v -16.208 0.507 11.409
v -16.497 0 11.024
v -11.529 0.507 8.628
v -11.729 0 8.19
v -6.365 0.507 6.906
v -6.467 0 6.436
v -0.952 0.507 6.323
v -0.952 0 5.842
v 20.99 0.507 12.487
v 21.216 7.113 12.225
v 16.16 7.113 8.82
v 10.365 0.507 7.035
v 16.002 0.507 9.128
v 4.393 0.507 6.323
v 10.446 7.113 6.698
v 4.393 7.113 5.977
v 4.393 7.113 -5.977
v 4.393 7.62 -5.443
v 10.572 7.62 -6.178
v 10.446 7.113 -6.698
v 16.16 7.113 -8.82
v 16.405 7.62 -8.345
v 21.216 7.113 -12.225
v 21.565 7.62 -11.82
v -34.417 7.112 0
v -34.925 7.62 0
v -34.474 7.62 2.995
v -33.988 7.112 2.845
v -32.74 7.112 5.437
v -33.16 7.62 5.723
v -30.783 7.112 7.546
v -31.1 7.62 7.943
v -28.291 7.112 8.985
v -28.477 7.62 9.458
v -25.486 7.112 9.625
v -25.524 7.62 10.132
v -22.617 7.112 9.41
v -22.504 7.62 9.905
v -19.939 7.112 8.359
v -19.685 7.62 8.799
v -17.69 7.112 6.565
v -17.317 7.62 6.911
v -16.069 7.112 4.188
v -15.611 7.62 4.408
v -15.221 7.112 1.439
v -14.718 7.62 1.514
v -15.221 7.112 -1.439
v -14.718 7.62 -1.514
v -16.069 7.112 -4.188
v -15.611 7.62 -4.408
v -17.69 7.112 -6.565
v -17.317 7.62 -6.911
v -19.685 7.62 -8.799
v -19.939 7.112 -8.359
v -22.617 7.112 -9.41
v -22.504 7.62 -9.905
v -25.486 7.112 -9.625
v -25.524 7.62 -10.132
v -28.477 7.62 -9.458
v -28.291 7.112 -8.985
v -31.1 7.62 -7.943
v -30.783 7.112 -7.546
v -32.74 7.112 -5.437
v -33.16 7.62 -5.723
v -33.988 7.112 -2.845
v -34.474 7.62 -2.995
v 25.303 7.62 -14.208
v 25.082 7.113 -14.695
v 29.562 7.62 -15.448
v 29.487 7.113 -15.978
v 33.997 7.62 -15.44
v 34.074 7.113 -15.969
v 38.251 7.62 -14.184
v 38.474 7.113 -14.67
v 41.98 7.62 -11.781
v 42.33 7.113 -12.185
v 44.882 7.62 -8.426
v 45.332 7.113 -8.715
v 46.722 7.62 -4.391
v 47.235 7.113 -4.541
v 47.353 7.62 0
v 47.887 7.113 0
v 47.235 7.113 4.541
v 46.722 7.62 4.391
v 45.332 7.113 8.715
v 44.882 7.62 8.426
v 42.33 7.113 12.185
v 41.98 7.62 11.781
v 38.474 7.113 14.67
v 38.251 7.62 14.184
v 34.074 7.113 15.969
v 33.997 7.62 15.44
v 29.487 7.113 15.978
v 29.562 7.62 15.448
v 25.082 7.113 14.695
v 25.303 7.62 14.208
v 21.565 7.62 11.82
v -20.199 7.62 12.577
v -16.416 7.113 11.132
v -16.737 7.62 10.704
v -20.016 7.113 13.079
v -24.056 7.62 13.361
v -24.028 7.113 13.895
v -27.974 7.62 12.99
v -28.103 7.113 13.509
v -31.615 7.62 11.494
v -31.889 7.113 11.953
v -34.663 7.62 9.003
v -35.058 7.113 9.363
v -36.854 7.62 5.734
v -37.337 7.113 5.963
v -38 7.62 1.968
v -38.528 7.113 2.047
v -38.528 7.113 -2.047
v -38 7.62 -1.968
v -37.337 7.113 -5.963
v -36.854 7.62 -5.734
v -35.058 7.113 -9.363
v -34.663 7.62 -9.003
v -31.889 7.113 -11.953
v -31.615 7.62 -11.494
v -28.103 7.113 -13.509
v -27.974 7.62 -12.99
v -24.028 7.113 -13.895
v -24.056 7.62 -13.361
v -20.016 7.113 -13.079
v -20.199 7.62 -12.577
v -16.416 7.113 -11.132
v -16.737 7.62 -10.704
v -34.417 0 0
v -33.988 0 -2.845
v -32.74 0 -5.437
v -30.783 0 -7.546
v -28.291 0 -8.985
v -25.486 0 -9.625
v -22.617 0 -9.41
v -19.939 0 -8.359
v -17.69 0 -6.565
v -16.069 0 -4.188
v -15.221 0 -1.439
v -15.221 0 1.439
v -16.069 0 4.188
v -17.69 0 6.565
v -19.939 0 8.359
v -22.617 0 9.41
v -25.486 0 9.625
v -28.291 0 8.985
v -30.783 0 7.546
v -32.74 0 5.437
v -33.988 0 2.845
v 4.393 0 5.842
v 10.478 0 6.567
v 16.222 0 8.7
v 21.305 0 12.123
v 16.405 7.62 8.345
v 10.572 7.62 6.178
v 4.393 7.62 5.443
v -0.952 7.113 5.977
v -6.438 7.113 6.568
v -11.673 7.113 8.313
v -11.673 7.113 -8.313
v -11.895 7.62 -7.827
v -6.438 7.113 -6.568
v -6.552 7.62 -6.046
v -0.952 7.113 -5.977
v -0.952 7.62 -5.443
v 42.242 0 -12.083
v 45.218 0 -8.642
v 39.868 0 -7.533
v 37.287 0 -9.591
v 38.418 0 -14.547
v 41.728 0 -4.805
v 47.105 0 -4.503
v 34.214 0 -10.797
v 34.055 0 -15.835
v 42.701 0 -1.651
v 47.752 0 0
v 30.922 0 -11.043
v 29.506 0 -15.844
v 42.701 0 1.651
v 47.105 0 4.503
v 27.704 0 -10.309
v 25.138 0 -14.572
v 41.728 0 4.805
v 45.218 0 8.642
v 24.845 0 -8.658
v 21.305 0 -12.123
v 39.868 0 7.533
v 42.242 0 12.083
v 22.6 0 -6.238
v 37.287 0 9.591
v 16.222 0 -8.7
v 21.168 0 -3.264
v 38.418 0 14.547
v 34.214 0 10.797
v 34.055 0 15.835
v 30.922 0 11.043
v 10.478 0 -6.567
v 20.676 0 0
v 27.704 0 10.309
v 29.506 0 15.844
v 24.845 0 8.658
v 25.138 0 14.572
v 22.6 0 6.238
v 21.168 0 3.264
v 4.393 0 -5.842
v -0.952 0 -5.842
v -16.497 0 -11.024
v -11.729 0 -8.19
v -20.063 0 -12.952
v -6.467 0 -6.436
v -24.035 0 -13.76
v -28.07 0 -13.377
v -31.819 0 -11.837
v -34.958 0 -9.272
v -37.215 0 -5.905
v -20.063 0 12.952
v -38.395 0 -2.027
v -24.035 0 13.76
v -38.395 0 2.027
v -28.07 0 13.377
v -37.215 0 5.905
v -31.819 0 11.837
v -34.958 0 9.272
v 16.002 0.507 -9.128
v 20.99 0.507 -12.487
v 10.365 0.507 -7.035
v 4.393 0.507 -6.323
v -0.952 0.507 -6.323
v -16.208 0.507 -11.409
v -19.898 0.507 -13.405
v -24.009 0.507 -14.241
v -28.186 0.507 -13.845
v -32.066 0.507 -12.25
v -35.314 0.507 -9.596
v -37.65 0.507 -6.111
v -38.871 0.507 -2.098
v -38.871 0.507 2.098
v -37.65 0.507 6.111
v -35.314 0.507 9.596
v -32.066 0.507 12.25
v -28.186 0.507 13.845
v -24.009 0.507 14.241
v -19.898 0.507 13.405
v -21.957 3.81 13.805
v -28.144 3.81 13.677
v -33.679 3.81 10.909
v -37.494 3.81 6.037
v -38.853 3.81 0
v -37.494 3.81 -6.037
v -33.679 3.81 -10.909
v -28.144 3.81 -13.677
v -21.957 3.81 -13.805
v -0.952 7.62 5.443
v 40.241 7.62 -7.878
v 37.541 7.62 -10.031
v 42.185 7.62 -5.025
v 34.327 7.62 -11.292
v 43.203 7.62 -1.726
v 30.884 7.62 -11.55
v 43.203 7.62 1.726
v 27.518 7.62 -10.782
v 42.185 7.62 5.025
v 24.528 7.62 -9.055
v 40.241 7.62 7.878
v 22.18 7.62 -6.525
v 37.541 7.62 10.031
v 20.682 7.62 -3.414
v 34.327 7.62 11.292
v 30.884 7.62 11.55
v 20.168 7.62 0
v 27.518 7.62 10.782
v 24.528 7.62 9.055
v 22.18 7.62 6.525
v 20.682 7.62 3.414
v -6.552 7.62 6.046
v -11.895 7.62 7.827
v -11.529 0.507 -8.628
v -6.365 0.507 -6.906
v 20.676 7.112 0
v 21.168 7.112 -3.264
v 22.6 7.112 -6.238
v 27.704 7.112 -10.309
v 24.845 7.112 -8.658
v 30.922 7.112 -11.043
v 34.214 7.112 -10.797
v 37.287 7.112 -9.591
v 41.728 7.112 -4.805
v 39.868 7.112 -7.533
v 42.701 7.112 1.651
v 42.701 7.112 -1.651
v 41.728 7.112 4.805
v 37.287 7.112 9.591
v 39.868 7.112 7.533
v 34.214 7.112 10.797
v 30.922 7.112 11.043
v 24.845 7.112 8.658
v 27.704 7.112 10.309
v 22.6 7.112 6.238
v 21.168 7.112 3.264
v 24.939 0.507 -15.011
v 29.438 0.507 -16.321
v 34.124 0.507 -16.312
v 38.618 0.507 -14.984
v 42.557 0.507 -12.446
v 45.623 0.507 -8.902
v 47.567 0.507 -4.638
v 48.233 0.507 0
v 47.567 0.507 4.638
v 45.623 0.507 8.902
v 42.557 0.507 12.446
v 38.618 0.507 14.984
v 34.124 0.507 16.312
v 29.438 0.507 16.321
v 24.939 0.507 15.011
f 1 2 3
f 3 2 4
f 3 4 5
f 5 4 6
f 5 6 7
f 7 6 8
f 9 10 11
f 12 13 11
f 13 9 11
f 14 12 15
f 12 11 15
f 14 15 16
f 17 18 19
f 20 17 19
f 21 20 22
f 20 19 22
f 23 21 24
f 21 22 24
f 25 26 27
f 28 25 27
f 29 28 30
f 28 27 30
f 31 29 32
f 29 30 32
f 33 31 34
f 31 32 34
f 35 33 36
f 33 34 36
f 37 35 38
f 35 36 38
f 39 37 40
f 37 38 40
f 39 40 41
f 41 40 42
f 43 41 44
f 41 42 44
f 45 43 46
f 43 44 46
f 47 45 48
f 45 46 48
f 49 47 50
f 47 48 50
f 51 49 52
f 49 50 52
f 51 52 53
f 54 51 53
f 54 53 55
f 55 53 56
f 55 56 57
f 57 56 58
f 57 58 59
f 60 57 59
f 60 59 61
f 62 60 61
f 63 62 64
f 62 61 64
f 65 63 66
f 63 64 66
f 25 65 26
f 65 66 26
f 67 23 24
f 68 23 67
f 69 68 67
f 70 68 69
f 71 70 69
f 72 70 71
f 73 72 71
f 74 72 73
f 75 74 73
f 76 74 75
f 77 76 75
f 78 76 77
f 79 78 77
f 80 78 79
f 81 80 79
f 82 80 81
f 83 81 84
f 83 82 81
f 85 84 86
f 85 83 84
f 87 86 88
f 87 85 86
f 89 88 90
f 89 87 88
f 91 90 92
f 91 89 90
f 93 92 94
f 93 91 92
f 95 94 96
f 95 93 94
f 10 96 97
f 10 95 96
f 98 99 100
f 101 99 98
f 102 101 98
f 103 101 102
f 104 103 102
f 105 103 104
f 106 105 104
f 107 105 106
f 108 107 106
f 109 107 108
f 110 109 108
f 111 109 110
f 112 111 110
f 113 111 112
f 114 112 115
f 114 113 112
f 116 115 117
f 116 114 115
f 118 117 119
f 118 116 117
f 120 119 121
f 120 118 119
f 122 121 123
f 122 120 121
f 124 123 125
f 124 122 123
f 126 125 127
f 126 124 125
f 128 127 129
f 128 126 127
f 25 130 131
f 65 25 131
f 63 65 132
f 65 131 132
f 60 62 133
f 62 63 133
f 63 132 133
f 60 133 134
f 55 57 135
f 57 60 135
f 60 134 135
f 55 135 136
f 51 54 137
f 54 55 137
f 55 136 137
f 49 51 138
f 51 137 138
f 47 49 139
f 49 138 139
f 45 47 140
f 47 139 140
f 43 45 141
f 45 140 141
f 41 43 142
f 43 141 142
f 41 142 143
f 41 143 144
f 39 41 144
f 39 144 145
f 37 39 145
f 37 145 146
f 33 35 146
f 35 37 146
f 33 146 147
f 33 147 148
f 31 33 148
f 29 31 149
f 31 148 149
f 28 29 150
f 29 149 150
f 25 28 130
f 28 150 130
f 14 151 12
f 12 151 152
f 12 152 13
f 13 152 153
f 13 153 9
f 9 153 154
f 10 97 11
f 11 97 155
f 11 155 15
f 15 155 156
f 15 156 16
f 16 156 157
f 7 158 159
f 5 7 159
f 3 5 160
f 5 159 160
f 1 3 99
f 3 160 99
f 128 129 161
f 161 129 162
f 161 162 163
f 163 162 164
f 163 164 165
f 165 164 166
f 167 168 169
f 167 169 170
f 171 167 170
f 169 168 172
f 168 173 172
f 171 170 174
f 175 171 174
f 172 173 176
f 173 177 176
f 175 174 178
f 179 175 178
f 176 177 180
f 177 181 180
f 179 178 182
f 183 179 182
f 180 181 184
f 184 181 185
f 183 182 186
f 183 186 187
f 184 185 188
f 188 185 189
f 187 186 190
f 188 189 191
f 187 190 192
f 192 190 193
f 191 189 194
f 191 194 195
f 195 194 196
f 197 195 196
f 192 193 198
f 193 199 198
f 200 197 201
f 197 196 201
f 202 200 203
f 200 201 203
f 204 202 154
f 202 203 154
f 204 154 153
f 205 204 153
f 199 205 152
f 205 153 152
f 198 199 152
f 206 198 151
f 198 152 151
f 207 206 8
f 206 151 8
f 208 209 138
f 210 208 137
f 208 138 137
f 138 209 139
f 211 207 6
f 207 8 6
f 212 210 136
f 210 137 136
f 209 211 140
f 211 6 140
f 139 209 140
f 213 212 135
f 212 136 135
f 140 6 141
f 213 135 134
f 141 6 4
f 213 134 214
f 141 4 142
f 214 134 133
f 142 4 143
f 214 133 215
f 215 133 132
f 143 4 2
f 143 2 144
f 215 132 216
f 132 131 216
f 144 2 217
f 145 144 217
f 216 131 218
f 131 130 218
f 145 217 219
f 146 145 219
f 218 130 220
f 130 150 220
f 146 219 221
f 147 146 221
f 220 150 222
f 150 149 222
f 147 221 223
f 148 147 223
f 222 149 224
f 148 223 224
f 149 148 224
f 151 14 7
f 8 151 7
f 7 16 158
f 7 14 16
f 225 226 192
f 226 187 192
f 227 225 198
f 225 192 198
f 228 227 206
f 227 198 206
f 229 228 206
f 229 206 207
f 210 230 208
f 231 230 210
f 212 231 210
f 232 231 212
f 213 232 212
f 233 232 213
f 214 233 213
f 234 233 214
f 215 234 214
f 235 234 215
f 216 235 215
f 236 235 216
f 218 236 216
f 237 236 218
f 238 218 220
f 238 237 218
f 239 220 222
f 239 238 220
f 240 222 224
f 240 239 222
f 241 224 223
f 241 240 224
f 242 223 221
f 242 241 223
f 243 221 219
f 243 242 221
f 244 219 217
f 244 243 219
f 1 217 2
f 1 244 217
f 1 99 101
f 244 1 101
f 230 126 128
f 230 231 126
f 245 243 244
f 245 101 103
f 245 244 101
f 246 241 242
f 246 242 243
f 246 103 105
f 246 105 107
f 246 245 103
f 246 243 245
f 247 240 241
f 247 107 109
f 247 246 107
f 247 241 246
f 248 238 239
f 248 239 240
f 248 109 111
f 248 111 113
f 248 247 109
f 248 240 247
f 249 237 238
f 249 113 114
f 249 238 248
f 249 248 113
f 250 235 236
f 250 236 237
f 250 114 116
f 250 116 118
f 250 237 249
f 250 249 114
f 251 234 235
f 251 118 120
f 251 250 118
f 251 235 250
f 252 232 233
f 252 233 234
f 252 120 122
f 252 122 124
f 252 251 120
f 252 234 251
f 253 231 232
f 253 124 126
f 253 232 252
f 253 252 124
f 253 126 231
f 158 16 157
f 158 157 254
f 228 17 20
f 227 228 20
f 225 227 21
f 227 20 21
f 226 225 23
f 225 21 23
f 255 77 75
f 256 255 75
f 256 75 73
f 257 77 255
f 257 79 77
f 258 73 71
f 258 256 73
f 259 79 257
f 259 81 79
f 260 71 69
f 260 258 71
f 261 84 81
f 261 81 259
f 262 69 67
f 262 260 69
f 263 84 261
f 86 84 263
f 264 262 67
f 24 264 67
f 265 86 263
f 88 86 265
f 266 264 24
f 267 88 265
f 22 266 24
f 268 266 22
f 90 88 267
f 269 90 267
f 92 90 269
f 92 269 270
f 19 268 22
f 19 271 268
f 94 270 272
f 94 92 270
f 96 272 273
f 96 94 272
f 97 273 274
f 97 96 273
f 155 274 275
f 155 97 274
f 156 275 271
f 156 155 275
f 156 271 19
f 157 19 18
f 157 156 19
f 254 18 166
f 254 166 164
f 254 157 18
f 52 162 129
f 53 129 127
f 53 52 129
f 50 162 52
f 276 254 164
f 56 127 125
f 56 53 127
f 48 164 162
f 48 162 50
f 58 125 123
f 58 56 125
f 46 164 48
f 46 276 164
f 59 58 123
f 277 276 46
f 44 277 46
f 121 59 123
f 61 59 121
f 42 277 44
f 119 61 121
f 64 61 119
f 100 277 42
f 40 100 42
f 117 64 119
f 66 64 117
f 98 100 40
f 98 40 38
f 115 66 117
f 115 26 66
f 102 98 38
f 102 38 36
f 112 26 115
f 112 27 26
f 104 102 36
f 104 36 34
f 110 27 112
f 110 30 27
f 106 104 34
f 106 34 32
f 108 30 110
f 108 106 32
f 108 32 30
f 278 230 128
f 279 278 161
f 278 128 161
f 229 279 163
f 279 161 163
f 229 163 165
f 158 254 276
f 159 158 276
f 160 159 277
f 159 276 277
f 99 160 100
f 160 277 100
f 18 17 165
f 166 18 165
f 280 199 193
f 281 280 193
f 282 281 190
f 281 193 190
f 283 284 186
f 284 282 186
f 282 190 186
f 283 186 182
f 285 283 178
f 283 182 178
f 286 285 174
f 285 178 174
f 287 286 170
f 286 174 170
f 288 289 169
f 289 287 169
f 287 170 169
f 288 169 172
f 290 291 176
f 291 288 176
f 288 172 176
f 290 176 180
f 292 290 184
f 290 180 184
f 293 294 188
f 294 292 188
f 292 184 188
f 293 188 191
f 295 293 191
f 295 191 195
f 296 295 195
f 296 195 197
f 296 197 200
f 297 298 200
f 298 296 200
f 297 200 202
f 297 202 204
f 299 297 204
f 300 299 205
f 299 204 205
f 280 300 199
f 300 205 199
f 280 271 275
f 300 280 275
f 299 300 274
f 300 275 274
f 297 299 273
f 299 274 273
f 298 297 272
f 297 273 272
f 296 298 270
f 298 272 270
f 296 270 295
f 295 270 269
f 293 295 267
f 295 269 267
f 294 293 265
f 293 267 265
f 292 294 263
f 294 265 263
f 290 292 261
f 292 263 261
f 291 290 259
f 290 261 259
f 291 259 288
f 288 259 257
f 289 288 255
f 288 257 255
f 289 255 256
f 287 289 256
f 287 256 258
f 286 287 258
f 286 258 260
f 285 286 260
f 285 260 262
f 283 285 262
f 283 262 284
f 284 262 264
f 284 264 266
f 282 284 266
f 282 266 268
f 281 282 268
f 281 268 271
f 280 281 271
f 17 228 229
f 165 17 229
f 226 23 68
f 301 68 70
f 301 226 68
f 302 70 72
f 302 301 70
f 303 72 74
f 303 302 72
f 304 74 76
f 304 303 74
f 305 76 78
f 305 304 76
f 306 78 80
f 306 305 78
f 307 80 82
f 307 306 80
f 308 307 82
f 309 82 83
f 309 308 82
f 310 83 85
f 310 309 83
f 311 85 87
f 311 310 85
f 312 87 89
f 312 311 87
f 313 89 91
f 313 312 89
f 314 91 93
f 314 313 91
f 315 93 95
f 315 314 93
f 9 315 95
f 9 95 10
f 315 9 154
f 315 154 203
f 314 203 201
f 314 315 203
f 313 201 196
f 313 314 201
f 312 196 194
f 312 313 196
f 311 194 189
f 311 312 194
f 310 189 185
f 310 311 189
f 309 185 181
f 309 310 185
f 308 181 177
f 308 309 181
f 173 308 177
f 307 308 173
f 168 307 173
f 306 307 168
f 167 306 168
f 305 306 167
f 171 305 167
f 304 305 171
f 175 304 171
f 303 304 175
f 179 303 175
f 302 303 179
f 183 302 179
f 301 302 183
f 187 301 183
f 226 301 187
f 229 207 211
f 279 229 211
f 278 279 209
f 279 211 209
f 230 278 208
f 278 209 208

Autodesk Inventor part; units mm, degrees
ref_plane "YZ Plane" through (0, 0, 0) normal (1, 0, 0) x (0, 1, 0)
ref_plane "XZ Plane" through (0, 0, 0) normal (0, 1, 0) x (-1, 0, 0)
ref_plane "XY Plane" through (0, 0, 0) normal (0, 0, 1) x (1, 0, 0)
sketch "Sketch1" plane through (0, 0, 0) normal (0, 1, 0) x (-1, 0, 0)
  circle A0 centre (-31.75, 0) radius 11.0744
  circle A1 centre (24.765, 0) radius 9.652
  line L0 (-16.51, -6.35) -> (11.9662, -6.35)
  circle A2 centre (24.765, 0) radius 14.2875
  circle A3 centre (-31.75, 0) radius 16.51
  line L1 (-16.51, 6.35) -> (11.9662, 6.35)
  point P0 (0, 0)
  dimension "d15" = 22.1488
  dimension "d17" = 12.7
  dimension "d18" = 33.02
  dimension "d19" = 19.304
  dimension "d20" = 28.575
  dimension "d21" = 56.515
extrude "Extrusion2" add sketch "Sketch1" along normal blind 7.62
fillet "Fillet3" radius 25.4 4 edges at (-11.9662, 3.81, 6.35) (-11.9662, 3.81, -6.35) (16.51, 3.81, -6.35) (16.51, 3.81, 6.35)
draft "FaceDraft2" angle 3 pull direction (0, 1, 0) faces at (41.7415, 5.08, -13.1435) (14.1702, 2.54, 8.307) (8.391, 2.54, -6.6666) (0.8295, 2.54, 6.35) (2.6114, 2.54, -6.35) (-2.7671, 2.54, 6.4149) (-4.5723, 2.54, -6.6093) (-18.1739, 5.08, 12.6764) fixed edges at (48.26, 0, 0) (13.2365, 0, 7.9391) (13.2365, 0, -7.9391) (1.7204, 0, 6.35) (1.7204, 0, -6.35) (-8.9847, 0, 7.6534) (-8.9847, 0, -7.6534) (-39.0525, 0, 0)
chamfer "Chamfer1" distance 0.508 angle 45 6 edges at (-38.6532, 7.62, 0) (1.7204, 7.62, -5.9507) (1.7204, 7.62, 5.9507) (47.8607, 7.62, 0) (42.8244, 7.62, 0) (-15.113, 7.62, 0)
chamfer "Chamfer2" distance 0.508 angle 45 4 edges at (-39.0525, 0, 0) (1.7204, 0, -6.35) (1.7204, 0, 6.35) (48.26, 0, 0)
properties part number "Connecting Rod"
